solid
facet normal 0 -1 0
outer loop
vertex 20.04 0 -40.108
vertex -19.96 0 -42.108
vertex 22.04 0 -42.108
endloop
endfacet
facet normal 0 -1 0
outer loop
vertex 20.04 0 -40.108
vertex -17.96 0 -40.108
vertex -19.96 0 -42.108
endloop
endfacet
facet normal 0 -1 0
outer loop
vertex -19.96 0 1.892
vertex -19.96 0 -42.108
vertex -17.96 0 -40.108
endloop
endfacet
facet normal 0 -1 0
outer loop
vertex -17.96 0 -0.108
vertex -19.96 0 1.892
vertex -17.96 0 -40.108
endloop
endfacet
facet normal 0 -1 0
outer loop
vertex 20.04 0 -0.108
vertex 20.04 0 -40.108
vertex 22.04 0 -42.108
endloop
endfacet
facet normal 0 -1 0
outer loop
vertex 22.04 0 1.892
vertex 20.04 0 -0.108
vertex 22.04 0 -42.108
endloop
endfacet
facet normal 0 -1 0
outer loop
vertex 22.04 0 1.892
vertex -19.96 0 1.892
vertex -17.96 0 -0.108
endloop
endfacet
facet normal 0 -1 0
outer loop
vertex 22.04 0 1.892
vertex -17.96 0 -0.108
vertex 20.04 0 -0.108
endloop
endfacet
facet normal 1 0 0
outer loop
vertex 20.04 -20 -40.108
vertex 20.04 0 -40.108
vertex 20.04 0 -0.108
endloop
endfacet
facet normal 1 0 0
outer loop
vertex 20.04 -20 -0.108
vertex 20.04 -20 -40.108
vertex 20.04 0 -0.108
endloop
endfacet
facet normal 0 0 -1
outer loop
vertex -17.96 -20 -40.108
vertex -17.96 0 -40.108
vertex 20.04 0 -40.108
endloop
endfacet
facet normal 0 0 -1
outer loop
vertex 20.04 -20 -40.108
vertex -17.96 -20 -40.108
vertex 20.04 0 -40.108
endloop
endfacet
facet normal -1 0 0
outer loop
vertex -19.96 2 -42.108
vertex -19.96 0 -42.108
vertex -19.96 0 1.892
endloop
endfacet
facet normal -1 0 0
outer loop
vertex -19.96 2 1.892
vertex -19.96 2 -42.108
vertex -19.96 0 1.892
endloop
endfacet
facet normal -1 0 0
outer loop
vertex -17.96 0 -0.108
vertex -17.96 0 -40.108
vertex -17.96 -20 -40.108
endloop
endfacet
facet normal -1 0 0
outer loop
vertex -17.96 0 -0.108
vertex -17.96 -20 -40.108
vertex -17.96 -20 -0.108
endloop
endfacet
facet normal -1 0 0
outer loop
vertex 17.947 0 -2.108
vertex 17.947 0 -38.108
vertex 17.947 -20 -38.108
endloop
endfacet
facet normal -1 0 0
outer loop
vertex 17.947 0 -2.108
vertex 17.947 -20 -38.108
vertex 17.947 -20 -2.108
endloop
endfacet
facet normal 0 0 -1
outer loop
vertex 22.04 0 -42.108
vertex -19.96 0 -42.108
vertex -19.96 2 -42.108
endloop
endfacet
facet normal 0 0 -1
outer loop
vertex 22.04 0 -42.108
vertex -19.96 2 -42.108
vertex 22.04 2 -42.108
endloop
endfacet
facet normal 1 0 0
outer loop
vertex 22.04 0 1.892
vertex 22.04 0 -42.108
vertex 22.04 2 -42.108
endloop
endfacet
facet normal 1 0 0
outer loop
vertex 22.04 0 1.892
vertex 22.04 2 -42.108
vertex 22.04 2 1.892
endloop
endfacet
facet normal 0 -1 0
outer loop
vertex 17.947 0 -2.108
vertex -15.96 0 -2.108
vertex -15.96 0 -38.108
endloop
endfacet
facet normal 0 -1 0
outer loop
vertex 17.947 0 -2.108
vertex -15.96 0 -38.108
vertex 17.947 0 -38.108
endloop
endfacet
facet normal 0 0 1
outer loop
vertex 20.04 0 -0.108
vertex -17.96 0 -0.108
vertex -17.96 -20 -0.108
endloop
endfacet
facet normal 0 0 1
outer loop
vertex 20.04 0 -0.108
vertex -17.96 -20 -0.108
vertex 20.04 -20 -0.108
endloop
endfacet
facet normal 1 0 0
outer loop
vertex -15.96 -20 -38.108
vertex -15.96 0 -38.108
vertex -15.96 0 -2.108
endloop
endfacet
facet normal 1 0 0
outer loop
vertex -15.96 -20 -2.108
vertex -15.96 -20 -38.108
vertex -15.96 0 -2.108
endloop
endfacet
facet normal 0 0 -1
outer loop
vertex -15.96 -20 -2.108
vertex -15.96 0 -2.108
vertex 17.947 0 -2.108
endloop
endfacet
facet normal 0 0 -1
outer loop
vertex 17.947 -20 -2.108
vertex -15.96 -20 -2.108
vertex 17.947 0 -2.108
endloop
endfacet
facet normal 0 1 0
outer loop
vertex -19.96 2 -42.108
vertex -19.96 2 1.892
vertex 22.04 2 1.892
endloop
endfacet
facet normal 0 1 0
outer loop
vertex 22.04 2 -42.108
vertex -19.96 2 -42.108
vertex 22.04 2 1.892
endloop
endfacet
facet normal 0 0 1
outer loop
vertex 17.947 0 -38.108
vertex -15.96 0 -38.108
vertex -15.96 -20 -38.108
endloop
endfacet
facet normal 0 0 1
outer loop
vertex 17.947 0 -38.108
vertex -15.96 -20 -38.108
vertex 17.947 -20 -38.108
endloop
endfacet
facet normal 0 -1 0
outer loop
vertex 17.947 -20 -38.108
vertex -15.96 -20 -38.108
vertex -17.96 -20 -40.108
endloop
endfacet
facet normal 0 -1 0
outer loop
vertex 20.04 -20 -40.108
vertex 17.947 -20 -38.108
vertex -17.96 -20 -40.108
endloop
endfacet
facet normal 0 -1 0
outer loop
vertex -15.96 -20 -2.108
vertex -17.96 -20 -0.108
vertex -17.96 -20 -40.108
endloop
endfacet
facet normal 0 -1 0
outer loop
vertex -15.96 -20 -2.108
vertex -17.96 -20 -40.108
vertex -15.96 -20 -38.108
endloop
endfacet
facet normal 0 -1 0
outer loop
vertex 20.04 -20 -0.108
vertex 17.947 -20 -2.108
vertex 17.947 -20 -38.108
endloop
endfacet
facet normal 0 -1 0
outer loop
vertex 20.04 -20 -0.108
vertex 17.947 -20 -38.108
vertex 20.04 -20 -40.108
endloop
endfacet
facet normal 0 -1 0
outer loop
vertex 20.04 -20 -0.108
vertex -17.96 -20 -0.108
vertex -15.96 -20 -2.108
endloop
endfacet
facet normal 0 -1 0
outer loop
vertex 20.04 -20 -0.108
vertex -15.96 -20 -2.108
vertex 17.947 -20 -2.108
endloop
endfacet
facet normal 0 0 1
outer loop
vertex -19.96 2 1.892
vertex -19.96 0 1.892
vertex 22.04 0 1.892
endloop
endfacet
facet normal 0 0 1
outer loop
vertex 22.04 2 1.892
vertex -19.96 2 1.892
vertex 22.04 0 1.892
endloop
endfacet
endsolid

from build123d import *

# Parameters (mm, degrees)
F0_W     = 38
F0_H     = 40
F0_W_2   = 33.907328
F0_H_2   = 36
F1_DEPTH = 20
F2_W     = 42
F2_H     = 44
F3_DEPTH = 2


with BuildPart() as f1:
    # F0 (on Front) → F1 (new body)
    with BuildSketch(Plane.XZ):
        with Locations((1.039558, -20.108323)):
            Rectangle(F0_W, F0_H)
        with Locations((0.993222, -20.108323)):
            Rectangle(F0_W_2, F0_H_2, mode=Mode.SUBTRACT)
    extrude(amount=F1_DEPTH)

    # F2 (on Front) → F3 (join)
    with BuildSketch(Plane.XZ):
        with Locations((1.039558, -20.108323)):
            Rectangle(F2_W, F2_H)
    extrude(amount=-F3_DEPTH)


solid = f1.part
